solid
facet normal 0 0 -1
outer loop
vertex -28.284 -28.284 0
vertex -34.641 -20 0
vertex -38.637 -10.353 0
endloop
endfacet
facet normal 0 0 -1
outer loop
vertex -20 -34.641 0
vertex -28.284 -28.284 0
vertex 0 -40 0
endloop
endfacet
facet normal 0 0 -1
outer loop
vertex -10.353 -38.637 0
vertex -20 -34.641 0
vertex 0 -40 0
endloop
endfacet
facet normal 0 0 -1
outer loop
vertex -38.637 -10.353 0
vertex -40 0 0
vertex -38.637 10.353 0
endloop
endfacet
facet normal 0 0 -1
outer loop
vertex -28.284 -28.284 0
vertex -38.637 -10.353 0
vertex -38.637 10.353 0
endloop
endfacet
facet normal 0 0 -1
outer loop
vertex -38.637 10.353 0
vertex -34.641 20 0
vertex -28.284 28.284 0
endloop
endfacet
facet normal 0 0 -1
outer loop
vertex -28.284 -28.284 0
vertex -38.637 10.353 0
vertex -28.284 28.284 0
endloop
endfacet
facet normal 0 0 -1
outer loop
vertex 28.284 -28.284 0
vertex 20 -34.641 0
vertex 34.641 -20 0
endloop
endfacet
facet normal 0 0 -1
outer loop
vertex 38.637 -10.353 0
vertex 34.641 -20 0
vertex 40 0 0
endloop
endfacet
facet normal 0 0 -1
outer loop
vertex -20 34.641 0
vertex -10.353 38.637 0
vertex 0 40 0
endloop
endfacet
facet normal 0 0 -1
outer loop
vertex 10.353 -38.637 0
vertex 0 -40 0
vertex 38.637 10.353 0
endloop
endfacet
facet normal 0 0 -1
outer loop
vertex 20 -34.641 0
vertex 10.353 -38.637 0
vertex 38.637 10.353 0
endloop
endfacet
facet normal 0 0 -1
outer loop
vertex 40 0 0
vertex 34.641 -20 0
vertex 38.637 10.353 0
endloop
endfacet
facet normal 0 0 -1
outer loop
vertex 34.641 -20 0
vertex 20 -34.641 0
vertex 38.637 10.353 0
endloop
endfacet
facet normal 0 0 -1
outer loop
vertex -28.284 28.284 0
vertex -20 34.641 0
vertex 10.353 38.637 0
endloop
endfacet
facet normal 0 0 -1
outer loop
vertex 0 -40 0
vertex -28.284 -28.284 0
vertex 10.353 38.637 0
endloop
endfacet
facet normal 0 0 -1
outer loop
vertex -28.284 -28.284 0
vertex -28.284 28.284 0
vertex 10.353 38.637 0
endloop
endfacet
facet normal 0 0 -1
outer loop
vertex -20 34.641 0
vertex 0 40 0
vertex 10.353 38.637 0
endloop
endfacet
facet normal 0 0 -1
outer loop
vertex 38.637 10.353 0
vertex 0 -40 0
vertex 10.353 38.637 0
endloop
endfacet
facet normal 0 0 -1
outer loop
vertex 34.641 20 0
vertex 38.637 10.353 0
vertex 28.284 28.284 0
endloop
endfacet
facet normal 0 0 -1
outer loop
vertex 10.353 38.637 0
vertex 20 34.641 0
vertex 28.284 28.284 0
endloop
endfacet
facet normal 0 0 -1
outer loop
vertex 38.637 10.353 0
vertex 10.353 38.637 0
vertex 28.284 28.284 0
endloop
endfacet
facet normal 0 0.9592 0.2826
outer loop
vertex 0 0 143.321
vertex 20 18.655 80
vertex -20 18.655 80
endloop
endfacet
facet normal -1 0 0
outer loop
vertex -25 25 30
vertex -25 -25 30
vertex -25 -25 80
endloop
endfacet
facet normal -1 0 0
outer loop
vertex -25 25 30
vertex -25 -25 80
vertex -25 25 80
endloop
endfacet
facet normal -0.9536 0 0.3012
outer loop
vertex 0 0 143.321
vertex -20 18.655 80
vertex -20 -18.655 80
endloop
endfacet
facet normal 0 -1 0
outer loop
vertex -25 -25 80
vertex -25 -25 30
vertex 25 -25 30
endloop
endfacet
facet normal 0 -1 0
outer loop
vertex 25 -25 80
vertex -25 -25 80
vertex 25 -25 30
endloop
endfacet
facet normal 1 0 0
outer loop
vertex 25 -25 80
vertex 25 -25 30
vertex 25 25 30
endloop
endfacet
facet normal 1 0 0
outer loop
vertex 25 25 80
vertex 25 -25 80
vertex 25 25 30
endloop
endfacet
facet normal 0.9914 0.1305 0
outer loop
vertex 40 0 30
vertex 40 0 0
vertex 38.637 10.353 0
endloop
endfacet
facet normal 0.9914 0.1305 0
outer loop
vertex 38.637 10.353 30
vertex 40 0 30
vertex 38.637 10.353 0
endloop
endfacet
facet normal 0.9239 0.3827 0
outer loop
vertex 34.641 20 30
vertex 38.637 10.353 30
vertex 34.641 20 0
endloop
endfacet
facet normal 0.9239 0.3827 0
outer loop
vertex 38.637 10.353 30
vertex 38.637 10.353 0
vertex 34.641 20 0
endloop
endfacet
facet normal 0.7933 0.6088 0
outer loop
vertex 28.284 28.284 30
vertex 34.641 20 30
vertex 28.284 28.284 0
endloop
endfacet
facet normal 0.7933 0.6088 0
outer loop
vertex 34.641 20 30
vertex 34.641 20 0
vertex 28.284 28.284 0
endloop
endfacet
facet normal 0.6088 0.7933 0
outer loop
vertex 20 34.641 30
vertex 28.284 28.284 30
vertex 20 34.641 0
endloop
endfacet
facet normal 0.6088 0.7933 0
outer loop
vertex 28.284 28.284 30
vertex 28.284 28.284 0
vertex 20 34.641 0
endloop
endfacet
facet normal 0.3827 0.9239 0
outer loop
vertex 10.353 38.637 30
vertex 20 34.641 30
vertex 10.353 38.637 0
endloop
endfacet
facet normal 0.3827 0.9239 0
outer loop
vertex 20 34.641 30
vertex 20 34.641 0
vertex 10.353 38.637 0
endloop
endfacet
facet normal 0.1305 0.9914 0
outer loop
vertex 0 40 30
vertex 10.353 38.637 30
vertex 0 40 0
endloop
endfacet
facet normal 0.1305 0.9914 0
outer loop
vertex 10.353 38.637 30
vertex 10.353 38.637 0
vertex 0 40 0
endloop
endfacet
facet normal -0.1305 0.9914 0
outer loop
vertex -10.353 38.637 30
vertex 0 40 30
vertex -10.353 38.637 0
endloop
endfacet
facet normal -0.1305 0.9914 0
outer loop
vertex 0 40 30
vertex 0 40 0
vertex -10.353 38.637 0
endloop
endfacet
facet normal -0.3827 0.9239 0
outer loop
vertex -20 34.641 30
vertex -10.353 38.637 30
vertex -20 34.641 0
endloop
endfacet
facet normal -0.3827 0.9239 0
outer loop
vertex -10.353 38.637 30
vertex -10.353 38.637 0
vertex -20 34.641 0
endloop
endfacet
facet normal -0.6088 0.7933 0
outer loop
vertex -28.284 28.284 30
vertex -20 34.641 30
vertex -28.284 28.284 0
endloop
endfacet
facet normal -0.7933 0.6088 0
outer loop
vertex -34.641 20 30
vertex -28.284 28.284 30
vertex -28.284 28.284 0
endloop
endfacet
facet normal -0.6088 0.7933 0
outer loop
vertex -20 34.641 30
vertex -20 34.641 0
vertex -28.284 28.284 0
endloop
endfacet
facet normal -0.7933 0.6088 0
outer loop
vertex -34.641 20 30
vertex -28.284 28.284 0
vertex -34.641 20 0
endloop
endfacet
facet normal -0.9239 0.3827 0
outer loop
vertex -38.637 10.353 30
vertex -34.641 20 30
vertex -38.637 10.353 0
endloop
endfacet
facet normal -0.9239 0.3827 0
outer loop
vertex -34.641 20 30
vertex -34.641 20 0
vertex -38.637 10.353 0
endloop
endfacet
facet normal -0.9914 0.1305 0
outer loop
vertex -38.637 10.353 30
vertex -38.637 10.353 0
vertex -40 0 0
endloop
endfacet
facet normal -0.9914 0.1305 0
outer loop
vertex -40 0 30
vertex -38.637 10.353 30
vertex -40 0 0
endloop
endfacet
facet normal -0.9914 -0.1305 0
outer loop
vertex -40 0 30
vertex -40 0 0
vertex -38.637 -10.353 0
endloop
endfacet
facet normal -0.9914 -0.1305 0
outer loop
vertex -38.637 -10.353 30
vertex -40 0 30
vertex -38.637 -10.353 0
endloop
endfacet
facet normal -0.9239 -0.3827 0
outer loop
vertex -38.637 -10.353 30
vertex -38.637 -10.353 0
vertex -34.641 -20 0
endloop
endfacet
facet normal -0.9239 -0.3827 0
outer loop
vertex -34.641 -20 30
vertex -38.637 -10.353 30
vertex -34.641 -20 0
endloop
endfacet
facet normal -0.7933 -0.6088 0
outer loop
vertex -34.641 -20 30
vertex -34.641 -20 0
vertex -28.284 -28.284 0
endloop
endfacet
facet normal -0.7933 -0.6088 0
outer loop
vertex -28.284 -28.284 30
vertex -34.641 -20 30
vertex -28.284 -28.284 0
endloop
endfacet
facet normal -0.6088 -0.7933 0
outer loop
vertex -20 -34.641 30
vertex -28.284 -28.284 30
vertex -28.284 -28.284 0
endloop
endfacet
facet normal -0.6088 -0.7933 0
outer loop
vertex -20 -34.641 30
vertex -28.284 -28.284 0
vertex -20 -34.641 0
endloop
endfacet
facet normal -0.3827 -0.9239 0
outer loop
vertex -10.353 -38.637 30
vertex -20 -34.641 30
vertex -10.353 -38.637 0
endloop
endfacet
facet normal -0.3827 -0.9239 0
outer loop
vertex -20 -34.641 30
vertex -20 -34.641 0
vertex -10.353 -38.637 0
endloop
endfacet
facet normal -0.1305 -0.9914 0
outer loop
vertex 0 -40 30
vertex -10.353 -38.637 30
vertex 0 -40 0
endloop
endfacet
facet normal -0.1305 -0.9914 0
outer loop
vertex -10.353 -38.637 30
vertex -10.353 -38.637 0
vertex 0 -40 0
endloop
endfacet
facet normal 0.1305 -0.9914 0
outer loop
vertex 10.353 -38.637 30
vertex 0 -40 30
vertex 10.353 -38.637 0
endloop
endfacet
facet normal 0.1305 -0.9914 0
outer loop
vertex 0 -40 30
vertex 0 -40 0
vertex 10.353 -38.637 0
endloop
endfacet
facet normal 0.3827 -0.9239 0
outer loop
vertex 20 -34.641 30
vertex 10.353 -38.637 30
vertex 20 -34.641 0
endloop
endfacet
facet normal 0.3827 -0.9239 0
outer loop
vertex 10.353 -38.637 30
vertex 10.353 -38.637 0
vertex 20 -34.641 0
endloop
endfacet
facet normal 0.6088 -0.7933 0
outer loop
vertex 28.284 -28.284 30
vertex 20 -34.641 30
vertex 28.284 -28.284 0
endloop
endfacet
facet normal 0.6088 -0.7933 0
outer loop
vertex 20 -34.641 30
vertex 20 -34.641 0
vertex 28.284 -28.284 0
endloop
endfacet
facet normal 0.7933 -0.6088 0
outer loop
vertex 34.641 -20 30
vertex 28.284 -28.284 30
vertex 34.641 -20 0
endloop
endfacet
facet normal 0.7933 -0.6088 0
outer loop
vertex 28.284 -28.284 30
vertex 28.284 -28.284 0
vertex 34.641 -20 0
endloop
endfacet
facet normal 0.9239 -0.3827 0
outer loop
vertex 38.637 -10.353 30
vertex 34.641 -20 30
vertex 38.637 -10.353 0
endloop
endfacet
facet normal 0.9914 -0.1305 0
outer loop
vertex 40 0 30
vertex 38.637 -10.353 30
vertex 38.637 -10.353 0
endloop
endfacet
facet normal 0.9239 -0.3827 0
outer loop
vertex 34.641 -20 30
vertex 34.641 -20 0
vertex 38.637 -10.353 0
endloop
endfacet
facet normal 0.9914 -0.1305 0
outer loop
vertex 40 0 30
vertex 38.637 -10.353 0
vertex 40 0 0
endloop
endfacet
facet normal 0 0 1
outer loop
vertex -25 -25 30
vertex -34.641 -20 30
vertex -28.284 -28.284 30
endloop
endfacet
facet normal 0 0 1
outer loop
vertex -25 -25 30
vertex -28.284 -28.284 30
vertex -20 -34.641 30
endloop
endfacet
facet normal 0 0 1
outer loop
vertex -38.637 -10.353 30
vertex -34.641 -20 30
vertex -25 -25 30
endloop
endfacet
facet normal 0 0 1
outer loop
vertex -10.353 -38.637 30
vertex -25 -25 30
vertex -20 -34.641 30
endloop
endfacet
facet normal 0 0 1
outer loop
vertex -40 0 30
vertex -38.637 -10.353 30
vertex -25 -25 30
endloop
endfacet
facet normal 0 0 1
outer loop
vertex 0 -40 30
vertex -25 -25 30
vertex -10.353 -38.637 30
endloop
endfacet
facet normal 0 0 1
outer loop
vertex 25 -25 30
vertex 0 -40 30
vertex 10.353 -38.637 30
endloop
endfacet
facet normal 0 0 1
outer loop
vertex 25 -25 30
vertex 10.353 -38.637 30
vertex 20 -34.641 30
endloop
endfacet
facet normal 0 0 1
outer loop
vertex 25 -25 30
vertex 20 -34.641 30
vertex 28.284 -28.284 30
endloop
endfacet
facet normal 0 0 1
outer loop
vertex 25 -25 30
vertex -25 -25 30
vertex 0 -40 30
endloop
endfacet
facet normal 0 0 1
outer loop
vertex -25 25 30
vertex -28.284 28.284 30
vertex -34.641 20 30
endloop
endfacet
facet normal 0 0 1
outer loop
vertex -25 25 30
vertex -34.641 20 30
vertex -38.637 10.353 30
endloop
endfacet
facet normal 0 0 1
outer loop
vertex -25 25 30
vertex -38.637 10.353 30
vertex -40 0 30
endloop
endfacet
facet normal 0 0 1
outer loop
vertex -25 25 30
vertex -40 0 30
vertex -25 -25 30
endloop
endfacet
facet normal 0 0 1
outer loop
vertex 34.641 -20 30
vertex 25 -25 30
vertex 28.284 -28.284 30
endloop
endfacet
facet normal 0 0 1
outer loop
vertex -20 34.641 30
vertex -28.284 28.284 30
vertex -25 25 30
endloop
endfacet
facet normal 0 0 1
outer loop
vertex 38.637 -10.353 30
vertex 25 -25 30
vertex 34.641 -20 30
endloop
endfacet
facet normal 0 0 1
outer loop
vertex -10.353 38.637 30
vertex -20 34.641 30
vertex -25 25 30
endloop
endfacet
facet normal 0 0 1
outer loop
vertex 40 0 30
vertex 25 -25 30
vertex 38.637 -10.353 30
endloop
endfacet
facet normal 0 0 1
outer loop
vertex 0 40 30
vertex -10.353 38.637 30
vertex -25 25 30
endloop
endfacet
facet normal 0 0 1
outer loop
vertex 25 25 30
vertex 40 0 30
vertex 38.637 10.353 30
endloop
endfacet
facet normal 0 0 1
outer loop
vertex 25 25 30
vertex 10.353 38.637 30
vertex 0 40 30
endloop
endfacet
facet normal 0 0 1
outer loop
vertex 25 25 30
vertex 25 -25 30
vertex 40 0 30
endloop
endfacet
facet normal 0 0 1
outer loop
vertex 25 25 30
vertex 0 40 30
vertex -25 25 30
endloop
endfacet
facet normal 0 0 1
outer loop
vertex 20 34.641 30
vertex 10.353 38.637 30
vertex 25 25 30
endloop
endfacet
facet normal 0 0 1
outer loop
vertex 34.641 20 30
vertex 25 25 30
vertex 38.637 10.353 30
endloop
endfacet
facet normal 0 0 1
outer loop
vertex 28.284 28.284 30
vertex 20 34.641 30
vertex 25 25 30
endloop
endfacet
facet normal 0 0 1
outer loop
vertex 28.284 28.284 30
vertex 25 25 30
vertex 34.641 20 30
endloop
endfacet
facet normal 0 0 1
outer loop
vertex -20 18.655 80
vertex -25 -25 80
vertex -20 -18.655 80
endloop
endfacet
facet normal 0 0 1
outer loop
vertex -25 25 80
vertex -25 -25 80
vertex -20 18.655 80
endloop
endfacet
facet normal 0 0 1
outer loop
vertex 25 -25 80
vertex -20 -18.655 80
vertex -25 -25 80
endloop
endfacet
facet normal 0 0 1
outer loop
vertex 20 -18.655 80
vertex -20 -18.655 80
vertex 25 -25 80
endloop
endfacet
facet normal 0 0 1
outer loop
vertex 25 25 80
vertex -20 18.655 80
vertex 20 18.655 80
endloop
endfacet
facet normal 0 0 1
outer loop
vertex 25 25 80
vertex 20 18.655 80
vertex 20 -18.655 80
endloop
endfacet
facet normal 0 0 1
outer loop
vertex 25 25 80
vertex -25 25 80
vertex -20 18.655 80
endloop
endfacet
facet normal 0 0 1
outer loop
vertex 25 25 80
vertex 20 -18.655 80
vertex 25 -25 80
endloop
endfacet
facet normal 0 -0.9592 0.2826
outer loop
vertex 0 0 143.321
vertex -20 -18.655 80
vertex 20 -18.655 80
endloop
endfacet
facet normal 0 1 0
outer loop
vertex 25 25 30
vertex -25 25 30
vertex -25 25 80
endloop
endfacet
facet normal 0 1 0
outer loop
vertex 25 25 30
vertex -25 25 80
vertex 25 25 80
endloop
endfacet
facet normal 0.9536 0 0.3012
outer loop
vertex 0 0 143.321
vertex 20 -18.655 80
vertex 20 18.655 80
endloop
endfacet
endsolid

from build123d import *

# Parameters (mm, degrees)
F0_R     = 40
F1_DEPTH = 30
F2_W     = 50
F2_H     = 50
F3_DEPTH = 50
F4_W     = 40
F4_H     = 37.309842


with BuildPart() as f1:
    # F0 (on Top) → F1 (new body)
    with BuildSketch(Plane.XY):
        Circle(F0_R)
    extrude(amount=F1_DEPTH)

    # F2 (on face) → F3 (join)
    with BuildSketch(Plane.XY.offset(30)):
        Rectangle(F2_W, F2_H)
    extrude(amount=F3_DEPTH)

    # F4 (on face) → F6 section 0
    with BuildSketch(Plane.XY.offset(80), mode=Mode.PRIVATE) as f6_s0:
        Rectangle(F4_W, F4_H)
    loft([Vertex(0, 0, 143.321168), f6_s0.sketch])


solid = f1.part
